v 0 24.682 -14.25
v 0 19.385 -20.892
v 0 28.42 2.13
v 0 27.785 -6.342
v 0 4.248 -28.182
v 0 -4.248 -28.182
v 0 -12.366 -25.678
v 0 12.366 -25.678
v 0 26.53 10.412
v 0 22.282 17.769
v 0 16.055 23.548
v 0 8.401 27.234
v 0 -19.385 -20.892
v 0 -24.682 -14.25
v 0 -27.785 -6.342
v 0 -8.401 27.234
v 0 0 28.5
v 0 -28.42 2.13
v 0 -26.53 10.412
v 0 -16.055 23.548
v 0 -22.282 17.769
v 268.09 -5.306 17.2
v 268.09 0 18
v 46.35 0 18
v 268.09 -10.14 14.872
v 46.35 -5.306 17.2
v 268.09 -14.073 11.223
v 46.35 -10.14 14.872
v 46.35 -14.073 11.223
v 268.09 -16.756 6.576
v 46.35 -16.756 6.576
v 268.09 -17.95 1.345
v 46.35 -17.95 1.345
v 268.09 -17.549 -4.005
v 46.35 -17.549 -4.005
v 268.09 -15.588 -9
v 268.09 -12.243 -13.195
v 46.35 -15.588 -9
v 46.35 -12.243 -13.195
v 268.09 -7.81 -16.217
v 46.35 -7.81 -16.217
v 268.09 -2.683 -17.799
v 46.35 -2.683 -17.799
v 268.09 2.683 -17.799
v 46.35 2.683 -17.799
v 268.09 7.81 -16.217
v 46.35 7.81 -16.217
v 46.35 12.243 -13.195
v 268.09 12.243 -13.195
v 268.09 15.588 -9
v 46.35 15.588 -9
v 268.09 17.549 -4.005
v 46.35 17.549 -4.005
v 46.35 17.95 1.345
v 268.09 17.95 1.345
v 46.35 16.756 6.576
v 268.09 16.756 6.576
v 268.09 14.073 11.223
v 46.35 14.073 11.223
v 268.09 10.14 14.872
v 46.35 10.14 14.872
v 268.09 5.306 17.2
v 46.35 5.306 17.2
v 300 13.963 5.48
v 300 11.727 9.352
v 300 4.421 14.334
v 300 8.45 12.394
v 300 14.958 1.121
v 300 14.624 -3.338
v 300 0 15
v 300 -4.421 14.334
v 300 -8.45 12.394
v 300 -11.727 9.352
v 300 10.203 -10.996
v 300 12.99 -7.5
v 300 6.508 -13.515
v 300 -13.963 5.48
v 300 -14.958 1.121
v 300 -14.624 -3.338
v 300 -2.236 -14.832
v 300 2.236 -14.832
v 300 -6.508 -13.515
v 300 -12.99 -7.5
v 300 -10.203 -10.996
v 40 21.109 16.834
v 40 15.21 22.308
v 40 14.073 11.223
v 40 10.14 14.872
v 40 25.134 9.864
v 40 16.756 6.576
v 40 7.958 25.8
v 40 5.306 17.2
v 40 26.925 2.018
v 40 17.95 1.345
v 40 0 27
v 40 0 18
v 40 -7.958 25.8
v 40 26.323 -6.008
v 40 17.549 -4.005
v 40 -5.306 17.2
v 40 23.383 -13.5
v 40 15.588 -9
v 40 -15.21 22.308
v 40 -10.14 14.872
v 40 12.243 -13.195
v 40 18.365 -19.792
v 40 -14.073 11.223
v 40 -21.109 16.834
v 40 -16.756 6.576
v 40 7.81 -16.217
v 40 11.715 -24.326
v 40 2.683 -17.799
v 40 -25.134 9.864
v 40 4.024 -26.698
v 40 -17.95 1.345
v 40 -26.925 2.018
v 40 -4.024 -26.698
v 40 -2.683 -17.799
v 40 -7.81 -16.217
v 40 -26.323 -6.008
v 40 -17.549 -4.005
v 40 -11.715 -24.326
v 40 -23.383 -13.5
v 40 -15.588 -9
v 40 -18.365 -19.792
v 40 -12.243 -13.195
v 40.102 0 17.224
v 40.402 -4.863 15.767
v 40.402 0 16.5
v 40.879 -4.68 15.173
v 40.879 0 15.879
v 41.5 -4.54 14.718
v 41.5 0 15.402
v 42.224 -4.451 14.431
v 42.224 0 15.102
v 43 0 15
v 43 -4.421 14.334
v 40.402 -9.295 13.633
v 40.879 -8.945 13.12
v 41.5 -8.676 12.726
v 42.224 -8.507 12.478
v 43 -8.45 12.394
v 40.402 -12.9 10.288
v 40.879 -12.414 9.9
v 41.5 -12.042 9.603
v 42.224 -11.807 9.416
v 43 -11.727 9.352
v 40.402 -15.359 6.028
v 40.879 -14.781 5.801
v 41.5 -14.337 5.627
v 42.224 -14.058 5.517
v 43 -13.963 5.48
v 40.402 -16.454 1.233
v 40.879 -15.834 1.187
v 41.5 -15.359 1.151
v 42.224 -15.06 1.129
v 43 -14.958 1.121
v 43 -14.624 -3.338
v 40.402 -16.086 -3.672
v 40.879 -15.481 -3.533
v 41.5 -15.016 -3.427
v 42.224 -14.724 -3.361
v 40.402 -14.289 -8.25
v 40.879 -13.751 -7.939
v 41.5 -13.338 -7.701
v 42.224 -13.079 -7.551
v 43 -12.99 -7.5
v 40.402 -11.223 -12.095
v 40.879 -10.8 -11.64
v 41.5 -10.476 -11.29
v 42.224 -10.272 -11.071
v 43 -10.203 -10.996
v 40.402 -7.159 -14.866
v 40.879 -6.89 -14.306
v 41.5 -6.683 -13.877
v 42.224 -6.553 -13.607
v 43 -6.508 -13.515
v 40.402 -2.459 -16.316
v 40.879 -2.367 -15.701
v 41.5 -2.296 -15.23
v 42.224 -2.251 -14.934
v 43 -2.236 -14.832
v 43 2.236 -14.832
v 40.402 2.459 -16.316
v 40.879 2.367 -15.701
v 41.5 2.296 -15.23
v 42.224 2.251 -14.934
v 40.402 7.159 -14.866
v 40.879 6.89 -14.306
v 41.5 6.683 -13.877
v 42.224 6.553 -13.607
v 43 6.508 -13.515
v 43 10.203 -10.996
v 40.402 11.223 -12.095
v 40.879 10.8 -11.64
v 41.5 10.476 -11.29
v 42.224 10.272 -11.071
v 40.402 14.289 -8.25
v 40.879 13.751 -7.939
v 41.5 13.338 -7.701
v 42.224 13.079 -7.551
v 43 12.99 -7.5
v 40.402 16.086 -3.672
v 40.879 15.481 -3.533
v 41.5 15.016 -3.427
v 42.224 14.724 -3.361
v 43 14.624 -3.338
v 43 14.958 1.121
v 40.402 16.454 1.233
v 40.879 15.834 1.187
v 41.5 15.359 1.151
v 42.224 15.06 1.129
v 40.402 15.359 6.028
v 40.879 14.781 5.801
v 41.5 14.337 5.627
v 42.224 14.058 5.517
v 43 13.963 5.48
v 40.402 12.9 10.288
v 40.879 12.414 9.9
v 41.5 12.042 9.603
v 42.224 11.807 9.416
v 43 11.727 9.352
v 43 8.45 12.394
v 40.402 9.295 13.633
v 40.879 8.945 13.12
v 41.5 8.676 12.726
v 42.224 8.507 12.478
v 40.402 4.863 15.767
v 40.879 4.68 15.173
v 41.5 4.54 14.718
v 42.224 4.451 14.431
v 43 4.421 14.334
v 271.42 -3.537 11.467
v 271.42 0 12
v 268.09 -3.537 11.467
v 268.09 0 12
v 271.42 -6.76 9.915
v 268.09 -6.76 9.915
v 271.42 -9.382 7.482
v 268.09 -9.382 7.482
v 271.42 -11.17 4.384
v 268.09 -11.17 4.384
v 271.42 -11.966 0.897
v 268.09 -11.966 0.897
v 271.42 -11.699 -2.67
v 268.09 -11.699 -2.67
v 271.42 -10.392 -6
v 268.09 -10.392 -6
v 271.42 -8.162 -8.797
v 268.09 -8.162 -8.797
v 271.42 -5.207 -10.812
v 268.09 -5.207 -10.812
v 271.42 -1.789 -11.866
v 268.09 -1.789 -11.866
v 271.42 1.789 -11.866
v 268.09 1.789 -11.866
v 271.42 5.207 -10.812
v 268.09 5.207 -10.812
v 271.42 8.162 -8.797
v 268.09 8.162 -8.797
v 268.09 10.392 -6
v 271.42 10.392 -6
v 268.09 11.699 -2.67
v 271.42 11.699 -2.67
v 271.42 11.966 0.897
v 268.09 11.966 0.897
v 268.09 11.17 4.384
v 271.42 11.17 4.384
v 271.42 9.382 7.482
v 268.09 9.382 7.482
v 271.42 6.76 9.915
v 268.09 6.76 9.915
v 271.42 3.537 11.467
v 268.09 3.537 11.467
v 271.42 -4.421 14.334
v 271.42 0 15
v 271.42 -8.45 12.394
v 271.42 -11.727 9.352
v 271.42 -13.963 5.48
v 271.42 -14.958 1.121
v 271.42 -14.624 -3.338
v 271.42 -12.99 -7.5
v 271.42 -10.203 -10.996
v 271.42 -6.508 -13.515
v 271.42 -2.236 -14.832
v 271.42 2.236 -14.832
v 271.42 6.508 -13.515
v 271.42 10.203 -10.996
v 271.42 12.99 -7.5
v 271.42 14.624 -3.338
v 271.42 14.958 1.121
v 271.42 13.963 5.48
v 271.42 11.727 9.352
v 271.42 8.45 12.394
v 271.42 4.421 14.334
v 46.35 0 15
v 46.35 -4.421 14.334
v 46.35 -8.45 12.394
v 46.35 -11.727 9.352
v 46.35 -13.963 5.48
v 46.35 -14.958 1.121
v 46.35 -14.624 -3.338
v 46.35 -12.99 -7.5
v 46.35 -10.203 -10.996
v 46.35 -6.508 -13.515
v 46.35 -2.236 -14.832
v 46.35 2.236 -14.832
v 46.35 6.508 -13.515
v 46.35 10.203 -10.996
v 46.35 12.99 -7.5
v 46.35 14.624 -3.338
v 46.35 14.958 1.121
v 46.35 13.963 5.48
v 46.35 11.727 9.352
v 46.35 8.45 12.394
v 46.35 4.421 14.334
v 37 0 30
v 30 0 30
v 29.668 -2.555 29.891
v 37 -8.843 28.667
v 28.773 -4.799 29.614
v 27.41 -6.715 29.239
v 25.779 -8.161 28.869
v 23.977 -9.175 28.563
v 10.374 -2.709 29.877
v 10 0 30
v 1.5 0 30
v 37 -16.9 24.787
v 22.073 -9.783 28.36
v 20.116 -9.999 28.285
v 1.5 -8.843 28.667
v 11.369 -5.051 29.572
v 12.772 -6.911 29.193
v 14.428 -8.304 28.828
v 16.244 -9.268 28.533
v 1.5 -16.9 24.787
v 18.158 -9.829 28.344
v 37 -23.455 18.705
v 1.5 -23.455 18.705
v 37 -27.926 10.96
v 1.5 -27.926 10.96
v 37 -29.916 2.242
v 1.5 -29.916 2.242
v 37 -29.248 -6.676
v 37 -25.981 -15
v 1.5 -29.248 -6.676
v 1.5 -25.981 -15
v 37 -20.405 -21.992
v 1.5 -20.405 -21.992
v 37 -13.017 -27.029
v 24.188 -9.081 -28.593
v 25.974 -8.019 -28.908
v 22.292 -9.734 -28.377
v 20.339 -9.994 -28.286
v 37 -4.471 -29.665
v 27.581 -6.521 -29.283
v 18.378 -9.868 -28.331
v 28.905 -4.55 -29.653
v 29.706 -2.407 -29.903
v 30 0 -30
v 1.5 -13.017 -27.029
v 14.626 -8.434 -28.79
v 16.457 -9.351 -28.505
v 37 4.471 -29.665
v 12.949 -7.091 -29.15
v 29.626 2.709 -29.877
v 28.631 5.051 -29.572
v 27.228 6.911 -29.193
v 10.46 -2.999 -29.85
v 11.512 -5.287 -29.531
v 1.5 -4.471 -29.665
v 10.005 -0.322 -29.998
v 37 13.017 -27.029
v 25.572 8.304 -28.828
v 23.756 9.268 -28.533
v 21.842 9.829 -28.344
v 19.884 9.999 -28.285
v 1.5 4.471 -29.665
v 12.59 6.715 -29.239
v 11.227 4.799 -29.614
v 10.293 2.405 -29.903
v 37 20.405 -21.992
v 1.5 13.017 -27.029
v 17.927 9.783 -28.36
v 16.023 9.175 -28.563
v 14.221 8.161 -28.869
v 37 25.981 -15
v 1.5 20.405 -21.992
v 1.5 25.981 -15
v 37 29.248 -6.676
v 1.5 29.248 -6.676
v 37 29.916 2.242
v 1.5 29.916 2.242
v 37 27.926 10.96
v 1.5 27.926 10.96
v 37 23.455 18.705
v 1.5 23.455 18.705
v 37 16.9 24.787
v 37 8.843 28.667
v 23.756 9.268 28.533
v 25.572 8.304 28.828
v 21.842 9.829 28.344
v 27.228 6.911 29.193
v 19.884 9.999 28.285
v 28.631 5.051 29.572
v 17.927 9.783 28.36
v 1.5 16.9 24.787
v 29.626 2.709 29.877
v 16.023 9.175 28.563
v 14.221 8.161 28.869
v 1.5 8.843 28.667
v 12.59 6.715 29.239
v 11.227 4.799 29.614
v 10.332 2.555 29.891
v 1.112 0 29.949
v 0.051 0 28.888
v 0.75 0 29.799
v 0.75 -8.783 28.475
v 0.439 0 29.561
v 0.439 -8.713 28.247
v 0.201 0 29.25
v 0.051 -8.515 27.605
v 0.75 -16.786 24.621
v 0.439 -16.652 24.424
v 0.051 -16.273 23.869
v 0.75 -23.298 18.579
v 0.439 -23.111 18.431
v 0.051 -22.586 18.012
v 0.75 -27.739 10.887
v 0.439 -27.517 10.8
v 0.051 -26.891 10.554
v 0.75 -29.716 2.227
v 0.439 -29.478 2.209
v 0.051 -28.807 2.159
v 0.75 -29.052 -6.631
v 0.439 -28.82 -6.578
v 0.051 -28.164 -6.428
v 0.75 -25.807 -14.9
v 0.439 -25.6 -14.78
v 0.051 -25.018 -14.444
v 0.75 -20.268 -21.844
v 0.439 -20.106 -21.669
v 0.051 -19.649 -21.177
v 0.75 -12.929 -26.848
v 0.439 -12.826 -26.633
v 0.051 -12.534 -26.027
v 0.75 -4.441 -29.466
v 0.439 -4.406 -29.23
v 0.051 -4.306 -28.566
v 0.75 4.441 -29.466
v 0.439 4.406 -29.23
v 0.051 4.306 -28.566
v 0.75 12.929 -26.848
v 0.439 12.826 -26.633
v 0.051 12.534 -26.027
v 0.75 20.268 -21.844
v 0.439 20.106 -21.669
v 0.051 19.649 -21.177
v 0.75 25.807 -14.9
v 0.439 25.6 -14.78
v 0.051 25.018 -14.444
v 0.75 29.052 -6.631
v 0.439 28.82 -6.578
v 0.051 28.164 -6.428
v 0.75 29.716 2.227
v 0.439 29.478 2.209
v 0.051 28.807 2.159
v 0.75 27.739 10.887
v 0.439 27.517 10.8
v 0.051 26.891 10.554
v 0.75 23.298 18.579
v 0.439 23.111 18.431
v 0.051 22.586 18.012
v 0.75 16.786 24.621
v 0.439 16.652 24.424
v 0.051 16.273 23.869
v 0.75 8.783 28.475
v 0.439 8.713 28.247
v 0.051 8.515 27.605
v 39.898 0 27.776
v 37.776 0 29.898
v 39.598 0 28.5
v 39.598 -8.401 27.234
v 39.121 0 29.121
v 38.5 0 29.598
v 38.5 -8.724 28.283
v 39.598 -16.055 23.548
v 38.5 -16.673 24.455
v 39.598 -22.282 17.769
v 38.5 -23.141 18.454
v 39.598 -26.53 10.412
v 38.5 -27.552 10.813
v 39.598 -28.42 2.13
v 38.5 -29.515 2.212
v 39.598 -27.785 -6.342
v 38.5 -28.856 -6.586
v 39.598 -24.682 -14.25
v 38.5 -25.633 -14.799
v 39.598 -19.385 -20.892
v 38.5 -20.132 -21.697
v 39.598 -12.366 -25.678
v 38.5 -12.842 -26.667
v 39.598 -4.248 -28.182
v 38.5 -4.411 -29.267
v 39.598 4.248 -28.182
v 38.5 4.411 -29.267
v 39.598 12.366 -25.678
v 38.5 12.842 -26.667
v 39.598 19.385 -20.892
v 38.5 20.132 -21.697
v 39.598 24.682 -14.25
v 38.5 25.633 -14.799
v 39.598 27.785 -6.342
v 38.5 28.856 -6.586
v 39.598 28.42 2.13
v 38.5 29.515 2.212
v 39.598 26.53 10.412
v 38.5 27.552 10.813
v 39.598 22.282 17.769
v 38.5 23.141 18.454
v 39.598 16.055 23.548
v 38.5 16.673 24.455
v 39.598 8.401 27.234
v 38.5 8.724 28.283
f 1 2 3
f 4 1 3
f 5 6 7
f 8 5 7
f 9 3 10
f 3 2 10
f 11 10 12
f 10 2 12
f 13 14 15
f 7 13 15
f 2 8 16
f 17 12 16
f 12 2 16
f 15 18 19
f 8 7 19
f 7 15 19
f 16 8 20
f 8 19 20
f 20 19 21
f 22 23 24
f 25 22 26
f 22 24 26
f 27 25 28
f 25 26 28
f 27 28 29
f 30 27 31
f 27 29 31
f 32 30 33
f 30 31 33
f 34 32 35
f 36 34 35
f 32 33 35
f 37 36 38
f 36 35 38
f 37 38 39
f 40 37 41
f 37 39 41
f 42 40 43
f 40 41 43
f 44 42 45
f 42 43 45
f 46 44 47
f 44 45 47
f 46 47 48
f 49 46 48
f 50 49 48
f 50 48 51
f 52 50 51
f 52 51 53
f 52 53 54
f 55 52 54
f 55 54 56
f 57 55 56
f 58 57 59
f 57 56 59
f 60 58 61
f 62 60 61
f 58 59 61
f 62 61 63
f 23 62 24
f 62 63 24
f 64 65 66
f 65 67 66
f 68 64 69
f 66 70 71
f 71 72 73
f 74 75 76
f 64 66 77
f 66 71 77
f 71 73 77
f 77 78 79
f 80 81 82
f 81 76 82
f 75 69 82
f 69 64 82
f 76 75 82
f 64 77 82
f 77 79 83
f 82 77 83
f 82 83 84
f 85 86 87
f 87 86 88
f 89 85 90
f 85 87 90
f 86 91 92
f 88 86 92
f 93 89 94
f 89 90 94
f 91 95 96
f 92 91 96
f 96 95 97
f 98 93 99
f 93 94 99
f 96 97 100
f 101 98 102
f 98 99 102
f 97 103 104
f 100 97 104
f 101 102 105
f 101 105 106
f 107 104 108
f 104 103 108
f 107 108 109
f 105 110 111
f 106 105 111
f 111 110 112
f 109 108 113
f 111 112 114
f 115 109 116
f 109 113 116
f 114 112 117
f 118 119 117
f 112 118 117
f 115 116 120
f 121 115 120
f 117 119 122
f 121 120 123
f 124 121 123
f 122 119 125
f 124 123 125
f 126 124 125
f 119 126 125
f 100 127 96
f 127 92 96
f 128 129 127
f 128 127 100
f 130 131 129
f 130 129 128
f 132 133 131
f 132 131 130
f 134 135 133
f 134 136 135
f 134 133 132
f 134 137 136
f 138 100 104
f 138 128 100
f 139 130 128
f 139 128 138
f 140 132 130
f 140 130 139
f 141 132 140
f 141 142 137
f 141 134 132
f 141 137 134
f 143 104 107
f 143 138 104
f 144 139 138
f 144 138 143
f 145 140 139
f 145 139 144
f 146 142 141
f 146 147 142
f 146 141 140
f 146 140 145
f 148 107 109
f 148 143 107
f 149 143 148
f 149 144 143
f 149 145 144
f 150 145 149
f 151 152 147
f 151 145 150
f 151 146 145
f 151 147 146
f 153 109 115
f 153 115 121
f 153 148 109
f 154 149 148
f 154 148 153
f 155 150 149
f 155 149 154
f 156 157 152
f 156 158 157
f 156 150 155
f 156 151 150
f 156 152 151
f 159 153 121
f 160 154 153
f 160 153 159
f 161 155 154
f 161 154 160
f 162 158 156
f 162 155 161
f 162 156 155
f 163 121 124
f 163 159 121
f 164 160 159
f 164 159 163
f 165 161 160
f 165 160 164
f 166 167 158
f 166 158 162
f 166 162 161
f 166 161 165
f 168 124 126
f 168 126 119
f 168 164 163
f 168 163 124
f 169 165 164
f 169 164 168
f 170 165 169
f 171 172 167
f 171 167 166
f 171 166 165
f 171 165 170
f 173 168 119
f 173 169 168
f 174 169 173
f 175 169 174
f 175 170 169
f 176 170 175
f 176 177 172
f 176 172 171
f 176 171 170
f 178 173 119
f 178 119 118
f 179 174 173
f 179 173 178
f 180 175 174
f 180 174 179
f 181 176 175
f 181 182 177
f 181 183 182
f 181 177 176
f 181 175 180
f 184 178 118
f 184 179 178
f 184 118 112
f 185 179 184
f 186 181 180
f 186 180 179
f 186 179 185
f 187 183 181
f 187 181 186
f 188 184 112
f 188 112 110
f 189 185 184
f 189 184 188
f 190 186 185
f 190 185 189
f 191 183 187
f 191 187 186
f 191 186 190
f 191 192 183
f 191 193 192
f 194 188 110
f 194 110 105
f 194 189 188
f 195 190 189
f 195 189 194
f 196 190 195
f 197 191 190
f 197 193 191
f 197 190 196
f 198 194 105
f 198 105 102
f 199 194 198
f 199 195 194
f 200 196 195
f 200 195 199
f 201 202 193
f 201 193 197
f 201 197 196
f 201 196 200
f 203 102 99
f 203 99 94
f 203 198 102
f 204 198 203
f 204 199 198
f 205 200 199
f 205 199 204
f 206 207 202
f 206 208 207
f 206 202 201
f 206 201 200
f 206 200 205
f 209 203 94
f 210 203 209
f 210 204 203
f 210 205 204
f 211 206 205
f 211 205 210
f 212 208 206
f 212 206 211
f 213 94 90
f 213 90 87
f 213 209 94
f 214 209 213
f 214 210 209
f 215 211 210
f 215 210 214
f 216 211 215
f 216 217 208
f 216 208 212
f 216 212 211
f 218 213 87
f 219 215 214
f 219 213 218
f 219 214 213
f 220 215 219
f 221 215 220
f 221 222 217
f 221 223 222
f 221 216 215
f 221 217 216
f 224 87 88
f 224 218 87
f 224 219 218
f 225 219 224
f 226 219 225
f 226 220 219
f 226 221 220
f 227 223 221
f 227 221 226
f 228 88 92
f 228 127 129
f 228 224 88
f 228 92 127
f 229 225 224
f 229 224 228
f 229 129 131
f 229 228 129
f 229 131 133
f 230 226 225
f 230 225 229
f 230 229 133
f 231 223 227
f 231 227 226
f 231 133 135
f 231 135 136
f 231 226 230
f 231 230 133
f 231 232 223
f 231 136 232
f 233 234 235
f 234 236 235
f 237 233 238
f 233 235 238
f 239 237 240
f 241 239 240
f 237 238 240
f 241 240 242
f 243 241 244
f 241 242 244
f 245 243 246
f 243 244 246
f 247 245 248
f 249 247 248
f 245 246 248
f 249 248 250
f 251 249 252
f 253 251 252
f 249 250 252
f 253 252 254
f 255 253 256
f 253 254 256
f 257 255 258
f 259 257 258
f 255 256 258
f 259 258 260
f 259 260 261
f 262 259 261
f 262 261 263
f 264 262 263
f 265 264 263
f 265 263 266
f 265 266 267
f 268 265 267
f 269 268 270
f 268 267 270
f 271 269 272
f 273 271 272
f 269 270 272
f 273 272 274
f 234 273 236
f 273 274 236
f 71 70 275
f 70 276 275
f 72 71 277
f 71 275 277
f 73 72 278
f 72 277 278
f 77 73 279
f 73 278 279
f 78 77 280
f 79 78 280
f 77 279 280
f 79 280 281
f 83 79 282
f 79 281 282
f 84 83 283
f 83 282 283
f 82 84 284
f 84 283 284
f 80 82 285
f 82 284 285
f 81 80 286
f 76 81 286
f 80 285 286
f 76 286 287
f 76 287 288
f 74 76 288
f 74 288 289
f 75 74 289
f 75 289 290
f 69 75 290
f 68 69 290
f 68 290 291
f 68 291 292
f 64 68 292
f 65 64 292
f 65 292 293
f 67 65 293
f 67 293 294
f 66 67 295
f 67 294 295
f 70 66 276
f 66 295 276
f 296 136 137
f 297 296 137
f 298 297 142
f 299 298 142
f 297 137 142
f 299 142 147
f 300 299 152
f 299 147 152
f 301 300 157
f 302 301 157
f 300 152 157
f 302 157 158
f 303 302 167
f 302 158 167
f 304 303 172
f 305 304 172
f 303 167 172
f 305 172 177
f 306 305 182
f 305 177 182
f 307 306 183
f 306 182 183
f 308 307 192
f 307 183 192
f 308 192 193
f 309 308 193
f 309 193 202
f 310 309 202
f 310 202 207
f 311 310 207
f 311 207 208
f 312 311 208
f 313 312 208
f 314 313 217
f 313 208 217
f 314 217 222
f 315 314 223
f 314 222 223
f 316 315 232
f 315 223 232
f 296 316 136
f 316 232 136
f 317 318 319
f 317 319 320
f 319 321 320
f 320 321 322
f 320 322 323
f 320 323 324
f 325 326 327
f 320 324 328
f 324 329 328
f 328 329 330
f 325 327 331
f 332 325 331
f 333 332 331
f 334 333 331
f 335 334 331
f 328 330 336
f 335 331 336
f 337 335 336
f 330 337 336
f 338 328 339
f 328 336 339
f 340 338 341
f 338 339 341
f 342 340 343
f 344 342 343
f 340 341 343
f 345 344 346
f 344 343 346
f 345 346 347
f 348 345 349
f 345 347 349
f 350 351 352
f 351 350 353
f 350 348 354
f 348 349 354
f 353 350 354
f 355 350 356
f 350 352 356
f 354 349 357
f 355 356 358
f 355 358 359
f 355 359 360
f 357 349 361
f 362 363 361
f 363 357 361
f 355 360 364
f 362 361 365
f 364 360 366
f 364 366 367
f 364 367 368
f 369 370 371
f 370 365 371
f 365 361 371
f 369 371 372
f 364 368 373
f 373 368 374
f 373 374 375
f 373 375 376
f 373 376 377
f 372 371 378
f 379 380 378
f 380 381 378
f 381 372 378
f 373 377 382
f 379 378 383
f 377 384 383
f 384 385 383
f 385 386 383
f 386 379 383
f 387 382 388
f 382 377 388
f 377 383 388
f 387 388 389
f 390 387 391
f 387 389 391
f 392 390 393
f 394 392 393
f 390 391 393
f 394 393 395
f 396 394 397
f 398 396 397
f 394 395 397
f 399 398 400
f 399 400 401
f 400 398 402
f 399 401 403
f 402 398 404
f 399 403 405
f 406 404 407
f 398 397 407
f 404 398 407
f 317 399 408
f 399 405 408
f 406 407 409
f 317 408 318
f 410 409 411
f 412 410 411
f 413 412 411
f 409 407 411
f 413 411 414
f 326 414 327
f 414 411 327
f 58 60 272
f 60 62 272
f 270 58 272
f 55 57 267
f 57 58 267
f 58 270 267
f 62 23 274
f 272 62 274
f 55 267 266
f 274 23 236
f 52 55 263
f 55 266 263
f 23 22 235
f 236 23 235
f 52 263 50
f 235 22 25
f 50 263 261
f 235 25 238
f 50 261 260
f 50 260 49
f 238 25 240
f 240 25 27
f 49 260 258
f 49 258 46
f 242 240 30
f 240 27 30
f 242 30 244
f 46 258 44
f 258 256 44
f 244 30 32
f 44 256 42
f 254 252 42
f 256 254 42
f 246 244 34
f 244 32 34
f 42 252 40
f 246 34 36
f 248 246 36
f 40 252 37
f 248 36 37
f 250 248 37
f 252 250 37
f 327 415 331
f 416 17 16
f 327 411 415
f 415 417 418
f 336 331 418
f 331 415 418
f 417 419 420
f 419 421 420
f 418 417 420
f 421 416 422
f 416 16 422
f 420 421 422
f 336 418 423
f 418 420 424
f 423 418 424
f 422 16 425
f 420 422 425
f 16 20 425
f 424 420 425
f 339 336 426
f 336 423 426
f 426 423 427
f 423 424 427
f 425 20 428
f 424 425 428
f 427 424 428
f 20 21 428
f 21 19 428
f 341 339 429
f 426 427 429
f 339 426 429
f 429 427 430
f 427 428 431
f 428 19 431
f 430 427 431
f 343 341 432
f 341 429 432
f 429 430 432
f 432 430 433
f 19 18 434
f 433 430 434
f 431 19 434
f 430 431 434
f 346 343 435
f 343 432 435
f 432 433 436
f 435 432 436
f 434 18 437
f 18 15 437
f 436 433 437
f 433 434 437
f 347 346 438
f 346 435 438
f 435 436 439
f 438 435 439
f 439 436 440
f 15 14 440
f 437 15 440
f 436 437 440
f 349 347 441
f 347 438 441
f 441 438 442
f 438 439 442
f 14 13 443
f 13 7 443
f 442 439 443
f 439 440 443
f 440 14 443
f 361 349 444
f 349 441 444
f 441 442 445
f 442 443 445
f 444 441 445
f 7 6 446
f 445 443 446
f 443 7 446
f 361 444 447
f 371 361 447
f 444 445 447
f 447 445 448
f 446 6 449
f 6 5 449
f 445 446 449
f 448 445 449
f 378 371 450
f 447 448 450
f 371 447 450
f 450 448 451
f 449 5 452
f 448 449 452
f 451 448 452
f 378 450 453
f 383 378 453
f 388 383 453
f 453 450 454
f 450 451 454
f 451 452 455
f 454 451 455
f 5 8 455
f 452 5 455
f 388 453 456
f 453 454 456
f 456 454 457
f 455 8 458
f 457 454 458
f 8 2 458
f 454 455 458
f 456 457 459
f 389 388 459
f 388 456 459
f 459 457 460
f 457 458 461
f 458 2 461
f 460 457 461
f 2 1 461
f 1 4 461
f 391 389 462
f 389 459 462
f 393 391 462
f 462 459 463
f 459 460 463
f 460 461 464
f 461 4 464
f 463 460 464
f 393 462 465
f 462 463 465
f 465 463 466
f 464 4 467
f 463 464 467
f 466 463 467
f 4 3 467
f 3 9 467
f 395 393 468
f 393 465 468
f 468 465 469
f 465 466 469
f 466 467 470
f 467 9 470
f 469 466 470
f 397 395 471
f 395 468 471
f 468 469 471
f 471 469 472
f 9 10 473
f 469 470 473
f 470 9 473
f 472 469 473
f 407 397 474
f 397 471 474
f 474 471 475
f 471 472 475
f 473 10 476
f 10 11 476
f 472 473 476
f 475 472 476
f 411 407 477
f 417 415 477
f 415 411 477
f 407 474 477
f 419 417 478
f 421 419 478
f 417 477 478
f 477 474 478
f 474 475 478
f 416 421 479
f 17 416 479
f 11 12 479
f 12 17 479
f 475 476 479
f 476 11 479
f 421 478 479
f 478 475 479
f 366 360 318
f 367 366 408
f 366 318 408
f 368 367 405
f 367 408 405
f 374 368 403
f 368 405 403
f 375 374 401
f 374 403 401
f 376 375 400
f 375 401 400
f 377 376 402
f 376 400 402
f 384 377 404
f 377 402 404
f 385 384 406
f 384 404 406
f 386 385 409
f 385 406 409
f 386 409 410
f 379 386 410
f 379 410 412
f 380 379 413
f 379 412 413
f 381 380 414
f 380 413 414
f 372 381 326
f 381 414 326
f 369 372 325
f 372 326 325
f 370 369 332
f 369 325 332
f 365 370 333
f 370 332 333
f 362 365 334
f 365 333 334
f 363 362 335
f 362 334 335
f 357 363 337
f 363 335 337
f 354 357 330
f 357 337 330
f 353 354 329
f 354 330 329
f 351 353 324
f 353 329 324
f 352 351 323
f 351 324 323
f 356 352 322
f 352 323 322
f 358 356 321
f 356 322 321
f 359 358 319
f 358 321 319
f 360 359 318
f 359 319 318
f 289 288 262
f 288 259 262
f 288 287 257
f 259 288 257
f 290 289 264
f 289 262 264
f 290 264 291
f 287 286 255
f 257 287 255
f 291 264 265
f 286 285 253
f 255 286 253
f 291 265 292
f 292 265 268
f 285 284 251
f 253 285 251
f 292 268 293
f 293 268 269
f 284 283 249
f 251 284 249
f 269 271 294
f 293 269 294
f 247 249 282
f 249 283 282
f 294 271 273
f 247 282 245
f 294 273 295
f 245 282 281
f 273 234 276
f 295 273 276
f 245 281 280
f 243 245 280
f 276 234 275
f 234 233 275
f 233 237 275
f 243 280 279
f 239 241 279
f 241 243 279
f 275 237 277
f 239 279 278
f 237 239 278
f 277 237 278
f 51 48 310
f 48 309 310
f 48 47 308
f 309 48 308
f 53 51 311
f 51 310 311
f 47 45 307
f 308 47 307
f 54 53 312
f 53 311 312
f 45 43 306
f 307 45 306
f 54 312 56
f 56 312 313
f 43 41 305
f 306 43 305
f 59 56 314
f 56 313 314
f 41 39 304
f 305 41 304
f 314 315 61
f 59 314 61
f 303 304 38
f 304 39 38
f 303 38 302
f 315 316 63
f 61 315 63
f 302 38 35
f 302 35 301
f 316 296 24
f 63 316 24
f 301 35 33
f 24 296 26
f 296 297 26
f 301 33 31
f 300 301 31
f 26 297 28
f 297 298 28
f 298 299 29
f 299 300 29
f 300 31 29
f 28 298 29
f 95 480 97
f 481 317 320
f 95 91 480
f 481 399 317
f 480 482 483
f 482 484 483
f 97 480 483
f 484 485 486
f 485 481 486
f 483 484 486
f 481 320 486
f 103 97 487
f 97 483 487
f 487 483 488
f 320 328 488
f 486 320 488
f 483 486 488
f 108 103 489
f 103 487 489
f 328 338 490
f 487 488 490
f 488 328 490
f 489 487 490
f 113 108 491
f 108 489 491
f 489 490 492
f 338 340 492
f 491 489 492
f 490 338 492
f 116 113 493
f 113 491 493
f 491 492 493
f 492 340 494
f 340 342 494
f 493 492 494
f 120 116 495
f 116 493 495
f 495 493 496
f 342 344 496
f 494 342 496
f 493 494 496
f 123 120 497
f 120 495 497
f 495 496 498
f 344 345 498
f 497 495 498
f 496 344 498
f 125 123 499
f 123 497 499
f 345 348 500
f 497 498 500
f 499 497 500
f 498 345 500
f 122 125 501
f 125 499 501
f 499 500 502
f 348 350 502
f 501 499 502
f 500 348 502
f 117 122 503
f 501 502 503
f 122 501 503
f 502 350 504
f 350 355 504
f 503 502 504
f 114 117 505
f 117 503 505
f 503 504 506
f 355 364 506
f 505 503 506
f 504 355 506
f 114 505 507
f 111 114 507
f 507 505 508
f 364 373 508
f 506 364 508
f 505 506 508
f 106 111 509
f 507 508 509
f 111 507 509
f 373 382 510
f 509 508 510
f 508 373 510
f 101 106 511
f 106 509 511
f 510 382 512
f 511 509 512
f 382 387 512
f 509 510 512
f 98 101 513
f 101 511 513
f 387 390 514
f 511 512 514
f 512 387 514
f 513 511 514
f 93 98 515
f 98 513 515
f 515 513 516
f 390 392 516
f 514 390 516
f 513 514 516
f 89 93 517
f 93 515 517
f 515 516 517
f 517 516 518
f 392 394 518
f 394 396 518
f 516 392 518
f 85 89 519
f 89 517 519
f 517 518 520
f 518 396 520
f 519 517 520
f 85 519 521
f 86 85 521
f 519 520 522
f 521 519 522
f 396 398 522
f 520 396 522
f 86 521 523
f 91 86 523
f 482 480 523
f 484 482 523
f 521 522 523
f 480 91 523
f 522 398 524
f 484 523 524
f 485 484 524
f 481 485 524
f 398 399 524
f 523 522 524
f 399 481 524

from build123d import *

# Parameters (mm, degrees)
FILLET1_R          = 1.5
SKETCH3_R          = 10
CUT_EXTRUDE1_DEPTH = 136.5
FILLET2_R          = 3
FILLET3_R          = 3


with BuildPart() as part:
    # Sketch1 → Revolve1 (revolve)
    with BuildSketch(Plane.XY, mode=Mode.PRIVATE) as revolve1_sk:
        Polygon((0, 0), (300, 0), (300, 15), (271.419940235, 15), (271.419940235, 12), (268.089940235, 12), (268.089940235, 18), (46.35, 18), (46.35, 15), (40, 15), (40, 30), (0, 30), align=None)
    revolve(revolve1_sk.sketch.rotate(Axis((0, 0, 0), (1, 0, 0)), 90), axis=Axis((0, 0, 0), (1, 0, 0)))

    # Fillet1
    fillet1_edges = [part.edges().sort_by_distance(p)[0] for p in [
        (0, 0, -30),
    ]]
    fillet(fillet1_edges, radius=FILLET1_R)

    # Sketch3 → Cut-Extrude1 (cut, symmetric)
    with BuildSketch(Plane.XY):
        with Locations((20, 0)):
            Circle(SKETCH3_R)
    extrude(amount=CUT_EXTRUDE1_DEPTH, both=True, mode=Mode.SUBTRACT)

    # Fillet2
    fillet2_edges = [part.edges().sort_by_distance(p)[0] for p in [
        (40, 0, -15),
    ]]
    fillet(fillet2_edges, radius=FILLET2_R)

    # Fillet3
    fillet3_edges = [part.edges().sort_by_distance(p)[0] for p in [
        (40, 0, -30),
    ]]
    fillet(fillet3_edges, radius=FILLET3_R)


solid = part.part
